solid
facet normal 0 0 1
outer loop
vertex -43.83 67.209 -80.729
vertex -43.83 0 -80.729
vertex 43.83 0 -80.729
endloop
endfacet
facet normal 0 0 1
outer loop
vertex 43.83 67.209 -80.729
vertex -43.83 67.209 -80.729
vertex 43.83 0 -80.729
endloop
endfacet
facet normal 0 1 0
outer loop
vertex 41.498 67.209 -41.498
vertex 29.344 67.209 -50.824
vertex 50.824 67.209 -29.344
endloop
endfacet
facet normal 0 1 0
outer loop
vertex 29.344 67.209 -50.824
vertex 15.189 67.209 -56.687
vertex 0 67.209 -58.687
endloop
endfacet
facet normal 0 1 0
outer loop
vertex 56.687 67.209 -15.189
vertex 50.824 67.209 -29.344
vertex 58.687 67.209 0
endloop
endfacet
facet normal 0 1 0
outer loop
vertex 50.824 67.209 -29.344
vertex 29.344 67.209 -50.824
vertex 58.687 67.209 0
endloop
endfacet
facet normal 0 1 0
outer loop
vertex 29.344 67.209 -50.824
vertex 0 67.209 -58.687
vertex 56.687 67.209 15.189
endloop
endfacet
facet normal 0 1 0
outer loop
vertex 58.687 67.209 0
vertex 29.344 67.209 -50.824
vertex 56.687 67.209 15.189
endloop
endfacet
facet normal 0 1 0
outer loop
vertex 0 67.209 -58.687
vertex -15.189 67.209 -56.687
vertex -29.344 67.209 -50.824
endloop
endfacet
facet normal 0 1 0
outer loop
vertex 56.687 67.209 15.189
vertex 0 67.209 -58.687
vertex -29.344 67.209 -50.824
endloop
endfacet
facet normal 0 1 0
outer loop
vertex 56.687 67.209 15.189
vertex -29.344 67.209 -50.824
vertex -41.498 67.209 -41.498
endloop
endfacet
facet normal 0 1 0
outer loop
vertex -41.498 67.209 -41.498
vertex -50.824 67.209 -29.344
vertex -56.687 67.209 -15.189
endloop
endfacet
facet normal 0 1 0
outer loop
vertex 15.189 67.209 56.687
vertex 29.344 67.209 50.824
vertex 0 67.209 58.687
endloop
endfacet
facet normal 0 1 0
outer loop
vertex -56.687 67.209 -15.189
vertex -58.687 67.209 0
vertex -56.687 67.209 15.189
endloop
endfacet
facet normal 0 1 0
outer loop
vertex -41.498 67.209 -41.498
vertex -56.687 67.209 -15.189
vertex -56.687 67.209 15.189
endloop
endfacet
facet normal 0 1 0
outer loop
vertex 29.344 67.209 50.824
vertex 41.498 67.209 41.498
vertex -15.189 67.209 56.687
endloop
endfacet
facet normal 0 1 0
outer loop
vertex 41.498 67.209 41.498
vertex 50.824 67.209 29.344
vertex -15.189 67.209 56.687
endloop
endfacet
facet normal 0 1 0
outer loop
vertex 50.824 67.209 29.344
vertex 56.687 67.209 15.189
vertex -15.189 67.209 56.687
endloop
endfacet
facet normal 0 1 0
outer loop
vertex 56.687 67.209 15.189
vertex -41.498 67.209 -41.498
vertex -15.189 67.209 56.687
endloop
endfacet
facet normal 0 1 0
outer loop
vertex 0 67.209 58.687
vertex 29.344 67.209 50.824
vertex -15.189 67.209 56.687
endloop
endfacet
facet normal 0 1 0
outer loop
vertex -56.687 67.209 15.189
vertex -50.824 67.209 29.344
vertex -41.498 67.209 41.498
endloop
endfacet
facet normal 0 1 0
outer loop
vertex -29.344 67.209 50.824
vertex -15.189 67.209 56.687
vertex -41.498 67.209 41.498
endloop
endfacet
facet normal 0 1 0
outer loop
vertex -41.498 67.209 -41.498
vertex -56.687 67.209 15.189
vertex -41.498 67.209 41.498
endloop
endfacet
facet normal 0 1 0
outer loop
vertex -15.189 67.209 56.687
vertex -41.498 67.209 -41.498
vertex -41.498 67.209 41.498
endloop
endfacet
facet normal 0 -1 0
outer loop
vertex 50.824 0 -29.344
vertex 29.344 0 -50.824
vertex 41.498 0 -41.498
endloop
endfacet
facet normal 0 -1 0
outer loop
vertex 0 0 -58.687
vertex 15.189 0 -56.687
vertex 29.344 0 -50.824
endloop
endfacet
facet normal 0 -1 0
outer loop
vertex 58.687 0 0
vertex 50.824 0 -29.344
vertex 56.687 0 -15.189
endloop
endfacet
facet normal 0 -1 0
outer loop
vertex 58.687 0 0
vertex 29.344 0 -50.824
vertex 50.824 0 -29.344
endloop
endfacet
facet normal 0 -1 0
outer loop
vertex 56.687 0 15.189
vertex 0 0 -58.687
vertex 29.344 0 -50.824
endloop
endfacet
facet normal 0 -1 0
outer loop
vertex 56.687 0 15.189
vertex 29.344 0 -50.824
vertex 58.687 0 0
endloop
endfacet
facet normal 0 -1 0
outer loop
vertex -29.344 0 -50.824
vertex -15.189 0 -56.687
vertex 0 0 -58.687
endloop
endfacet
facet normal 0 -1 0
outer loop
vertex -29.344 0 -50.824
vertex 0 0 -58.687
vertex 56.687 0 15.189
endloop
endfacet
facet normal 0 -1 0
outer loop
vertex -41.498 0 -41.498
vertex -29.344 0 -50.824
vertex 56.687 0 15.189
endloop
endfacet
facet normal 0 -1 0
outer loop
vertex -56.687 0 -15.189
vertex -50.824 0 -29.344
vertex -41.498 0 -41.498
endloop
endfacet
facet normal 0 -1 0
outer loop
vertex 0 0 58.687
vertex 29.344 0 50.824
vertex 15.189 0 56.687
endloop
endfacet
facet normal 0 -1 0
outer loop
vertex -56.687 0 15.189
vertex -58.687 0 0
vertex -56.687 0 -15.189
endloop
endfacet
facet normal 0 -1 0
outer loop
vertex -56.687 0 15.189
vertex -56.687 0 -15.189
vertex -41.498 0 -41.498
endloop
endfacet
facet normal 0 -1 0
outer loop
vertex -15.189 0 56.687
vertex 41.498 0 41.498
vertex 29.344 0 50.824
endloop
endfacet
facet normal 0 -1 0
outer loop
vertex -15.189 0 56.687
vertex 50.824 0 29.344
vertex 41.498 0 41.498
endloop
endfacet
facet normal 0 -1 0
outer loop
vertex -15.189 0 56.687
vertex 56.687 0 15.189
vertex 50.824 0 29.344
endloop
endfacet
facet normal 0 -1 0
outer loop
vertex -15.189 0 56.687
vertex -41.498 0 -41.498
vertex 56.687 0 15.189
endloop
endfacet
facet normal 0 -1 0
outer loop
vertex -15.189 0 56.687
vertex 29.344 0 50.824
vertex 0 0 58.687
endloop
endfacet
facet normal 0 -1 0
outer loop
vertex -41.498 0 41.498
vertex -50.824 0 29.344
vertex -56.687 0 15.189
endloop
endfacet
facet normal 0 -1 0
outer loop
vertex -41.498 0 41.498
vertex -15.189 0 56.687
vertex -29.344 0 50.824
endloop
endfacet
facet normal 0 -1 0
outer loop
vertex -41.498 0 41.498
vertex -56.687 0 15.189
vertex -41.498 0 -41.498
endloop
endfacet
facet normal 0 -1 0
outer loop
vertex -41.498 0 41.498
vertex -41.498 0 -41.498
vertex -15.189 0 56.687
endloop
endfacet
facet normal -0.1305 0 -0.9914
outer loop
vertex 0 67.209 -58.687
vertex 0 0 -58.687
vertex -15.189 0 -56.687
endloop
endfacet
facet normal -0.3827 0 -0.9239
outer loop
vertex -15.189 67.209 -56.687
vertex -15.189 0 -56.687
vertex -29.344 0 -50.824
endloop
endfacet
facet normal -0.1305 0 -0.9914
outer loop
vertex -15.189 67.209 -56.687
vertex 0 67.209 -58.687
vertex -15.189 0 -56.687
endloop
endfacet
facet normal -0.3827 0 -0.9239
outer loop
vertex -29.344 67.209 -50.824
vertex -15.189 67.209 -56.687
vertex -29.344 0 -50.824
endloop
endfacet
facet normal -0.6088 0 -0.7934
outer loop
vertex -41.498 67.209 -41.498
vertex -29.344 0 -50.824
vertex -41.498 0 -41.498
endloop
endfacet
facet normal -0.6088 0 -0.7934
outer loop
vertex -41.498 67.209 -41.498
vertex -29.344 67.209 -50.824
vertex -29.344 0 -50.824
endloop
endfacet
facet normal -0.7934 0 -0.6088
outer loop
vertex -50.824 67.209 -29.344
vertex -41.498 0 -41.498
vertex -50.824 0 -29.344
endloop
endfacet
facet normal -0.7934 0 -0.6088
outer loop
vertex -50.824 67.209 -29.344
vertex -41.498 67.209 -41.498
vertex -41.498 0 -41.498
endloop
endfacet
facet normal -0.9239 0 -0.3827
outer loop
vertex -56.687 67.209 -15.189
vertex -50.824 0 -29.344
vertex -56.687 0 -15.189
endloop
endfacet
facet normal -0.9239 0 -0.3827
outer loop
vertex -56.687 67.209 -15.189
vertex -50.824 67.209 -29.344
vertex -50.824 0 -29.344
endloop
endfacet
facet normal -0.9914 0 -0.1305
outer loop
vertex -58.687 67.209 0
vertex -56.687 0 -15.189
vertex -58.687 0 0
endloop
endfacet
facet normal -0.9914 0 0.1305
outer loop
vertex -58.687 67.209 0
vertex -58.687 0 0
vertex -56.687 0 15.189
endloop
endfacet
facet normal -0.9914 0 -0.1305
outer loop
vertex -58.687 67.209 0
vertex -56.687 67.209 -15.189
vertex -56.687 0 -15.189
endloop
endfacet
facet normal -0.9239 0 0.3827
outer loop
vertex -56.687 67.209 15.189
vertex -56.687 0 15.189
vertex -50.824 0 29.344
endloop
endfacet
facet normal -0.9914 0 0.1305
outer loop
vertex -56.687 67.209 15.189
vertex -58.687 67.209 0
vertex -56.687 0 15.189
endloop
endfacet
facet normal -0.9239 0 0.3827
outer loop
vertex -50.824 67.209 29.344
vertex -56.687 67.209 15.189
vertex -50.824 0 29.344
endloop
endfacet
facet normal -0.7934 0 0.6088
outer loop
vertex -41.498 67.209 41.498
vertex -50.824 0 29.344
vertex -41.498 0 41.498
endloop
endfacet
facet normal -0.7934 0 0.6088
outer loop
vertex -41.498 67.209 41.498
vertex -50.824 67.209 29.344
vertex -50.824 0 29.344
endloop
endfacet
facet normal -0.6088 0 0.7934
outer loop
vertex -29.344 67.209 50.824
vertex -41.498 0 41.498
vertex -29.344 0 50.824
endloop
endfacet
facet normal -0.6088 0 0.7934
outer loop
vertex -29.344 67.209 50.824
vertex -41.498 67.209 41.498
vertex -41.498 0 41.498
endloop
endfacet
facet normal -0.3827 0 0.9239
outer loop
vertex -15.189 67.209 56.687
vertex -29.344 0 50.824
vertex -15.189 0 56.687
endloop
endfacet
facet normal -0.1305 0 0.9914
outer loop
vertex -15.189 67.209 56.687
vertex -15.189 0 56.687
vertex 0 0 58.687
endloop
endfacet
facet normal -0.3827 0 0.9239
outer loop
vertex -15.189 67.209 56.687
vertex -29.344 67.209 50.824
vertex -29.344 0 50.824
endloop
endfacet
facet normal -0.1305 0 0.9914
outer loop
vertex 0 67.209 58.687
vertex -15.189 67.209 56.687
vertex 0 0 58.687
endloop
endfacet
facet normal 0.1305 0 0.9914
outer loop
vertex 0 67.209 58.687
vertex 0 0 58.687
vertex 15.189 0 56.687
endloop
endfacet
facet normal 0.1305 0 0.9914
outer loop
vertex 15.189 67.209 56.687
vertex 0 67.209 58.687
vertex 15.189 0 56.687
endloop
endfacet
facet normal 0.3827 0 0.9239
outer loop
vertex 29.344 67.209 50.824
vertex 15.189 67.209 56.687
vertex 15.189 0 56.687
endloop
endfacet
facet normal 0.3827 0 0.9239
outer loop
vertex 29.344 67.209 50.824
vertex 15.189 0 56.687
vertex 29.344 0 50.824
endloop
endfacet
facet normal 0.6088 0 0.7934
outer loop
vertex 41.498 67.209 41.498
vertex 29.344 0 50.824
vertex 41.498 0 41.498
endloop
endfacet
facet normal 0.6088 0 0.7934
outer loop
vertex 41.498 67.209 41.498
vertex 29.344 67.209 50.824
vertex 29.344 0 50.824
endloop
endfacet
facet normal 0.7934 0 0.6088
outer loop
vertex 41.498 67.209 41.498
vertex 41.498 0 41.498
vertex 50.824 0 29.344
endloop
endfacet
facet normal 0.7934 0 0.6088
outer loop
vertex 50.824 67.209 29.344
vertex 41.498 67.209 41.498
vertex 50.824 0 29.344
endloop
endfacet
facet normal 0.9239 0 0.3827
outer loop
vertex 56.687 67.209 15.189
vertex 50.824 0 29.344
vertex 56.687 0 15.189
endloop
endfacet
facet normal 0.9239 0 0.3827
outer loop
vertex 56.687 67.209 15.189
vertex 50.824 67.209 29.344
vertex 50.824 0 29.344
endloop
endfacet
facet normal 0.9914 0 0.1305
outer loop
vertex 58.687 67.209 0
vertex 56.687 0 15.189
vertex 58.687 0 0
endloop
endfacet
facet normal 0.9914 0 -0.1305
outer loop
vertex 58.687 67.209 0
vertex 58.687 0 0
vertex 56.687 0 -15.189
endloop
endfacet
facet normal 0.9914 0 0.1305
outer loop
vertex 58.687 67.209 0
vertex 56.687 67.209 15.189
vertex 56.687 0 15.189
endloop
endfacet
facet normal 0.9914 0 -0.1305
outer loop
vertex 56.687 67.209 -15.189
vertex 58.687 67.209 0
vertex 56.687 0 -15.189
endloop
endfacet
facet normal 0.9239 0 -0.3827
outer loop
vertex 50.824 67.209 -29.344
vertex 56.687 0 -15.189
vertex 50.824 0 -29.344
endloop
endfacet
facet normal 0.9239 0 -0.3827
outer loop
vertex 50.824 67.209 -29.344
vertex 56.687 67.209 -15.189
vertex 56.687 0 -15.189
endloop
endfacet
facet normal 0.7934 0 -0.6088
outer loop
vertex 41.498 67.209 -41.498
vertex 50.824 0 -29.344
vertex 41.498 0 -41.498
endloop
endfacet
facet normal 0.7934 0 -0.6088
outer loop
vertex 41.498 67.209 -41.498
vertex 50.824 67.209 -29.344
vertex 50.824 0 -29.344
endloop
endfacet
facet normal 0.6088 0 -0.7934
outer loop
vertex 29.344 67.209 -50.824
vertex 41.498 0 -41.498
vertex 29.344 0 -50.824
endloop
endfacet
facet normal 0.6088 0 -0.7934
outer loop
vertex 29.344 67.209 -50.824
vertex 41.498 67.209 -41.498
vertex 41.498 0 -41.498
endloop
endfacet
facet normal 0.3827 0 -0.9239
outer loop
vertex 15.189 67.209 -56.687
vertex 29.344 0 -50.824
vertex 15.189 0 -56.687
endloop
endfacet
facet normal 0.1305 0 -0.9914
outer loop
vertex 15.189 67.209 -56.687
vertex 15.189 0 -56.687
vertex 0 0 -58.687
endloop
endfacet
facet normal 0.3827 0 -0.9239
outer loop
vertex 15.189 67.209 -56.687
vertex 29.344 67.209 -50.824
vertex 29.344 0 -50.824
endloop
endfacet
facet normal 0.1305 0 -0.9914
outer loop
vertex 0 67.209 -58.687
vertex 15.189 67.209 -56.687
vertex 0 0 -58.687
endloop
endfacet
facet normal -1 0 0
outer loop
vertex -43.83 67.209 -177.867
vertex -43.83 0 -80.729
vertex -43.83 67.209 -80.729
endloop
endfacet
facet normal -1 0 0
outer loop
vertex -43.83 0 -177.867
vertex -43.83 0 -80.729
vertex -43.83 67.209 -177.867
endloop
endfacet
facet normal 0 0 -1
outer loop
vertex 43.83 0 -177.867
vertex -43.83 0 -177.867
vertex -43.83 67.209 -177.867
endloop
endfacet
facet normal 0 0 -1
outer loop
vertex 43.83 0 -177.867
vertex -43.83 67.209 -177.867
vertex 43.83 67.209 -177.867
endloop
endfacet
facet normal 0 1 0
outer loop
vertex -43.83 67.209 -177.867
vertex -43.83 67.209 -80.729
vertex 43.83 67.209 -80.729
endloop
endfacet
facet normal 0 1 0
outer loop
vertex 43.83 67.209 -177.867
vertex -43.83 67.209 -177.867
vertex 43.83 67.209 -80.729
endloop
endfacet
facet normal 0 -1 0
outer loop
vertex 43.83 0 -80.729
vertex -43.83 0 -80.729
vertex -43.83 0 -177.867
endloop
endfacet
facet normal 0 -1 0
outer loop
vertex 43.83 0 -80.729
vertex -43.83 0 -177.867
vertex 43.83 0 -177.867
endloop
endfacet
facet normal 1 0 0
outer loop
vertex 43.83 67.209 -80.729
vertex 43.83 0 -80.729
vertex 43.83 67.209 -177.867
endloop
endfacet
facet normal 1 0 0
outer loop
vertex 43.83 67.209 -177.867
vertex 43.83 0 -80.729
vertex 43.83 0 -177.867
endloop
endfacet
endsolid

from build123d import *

# Parameters (mm, degrees)
SKETCH1_W           = 58.68704402
SKETCH1_H           = 67.209255033
SKETCH2_W           = 87.660679444
SKETCH2_H           = 97.137509655
BOSS_EXTRUDE1_DEPTH = 67.209255033


with BuildPart() as part:
    # Sketch1 → Revolve1 (revolve)
    with BuildSketch(Plane.XY, mode=Mode.PRIVATE) as revolve1_sk:
        with Locations((29.34352201, 33.604627517)):
            Rectangle(SKETCH1_W, SKETCH1_H)
    revolve(revolve1_sk.sketch.rotate(Axis((0, 0, 0), (0, 1, 0)), 90), axis=Axis((0, 0, 0), (0, 1, 0)))


with BuildPart() as body_2:
    # Sketch2 → Boss-Extrude1 (new body)
    with BuildSketch(Plane(origin=(0, 0, 0), x_dir=(1, 0, 0), z_dir=(0, 1, 0))):
        with Locations((0, 129.298002943)):
            Rectangle(SKETCH2_W, SKETCH2_H)
    extrude(amount=BOSS_EXTRUDE1_DEPTH)


solid = Compound([part.part, body_2.part])
